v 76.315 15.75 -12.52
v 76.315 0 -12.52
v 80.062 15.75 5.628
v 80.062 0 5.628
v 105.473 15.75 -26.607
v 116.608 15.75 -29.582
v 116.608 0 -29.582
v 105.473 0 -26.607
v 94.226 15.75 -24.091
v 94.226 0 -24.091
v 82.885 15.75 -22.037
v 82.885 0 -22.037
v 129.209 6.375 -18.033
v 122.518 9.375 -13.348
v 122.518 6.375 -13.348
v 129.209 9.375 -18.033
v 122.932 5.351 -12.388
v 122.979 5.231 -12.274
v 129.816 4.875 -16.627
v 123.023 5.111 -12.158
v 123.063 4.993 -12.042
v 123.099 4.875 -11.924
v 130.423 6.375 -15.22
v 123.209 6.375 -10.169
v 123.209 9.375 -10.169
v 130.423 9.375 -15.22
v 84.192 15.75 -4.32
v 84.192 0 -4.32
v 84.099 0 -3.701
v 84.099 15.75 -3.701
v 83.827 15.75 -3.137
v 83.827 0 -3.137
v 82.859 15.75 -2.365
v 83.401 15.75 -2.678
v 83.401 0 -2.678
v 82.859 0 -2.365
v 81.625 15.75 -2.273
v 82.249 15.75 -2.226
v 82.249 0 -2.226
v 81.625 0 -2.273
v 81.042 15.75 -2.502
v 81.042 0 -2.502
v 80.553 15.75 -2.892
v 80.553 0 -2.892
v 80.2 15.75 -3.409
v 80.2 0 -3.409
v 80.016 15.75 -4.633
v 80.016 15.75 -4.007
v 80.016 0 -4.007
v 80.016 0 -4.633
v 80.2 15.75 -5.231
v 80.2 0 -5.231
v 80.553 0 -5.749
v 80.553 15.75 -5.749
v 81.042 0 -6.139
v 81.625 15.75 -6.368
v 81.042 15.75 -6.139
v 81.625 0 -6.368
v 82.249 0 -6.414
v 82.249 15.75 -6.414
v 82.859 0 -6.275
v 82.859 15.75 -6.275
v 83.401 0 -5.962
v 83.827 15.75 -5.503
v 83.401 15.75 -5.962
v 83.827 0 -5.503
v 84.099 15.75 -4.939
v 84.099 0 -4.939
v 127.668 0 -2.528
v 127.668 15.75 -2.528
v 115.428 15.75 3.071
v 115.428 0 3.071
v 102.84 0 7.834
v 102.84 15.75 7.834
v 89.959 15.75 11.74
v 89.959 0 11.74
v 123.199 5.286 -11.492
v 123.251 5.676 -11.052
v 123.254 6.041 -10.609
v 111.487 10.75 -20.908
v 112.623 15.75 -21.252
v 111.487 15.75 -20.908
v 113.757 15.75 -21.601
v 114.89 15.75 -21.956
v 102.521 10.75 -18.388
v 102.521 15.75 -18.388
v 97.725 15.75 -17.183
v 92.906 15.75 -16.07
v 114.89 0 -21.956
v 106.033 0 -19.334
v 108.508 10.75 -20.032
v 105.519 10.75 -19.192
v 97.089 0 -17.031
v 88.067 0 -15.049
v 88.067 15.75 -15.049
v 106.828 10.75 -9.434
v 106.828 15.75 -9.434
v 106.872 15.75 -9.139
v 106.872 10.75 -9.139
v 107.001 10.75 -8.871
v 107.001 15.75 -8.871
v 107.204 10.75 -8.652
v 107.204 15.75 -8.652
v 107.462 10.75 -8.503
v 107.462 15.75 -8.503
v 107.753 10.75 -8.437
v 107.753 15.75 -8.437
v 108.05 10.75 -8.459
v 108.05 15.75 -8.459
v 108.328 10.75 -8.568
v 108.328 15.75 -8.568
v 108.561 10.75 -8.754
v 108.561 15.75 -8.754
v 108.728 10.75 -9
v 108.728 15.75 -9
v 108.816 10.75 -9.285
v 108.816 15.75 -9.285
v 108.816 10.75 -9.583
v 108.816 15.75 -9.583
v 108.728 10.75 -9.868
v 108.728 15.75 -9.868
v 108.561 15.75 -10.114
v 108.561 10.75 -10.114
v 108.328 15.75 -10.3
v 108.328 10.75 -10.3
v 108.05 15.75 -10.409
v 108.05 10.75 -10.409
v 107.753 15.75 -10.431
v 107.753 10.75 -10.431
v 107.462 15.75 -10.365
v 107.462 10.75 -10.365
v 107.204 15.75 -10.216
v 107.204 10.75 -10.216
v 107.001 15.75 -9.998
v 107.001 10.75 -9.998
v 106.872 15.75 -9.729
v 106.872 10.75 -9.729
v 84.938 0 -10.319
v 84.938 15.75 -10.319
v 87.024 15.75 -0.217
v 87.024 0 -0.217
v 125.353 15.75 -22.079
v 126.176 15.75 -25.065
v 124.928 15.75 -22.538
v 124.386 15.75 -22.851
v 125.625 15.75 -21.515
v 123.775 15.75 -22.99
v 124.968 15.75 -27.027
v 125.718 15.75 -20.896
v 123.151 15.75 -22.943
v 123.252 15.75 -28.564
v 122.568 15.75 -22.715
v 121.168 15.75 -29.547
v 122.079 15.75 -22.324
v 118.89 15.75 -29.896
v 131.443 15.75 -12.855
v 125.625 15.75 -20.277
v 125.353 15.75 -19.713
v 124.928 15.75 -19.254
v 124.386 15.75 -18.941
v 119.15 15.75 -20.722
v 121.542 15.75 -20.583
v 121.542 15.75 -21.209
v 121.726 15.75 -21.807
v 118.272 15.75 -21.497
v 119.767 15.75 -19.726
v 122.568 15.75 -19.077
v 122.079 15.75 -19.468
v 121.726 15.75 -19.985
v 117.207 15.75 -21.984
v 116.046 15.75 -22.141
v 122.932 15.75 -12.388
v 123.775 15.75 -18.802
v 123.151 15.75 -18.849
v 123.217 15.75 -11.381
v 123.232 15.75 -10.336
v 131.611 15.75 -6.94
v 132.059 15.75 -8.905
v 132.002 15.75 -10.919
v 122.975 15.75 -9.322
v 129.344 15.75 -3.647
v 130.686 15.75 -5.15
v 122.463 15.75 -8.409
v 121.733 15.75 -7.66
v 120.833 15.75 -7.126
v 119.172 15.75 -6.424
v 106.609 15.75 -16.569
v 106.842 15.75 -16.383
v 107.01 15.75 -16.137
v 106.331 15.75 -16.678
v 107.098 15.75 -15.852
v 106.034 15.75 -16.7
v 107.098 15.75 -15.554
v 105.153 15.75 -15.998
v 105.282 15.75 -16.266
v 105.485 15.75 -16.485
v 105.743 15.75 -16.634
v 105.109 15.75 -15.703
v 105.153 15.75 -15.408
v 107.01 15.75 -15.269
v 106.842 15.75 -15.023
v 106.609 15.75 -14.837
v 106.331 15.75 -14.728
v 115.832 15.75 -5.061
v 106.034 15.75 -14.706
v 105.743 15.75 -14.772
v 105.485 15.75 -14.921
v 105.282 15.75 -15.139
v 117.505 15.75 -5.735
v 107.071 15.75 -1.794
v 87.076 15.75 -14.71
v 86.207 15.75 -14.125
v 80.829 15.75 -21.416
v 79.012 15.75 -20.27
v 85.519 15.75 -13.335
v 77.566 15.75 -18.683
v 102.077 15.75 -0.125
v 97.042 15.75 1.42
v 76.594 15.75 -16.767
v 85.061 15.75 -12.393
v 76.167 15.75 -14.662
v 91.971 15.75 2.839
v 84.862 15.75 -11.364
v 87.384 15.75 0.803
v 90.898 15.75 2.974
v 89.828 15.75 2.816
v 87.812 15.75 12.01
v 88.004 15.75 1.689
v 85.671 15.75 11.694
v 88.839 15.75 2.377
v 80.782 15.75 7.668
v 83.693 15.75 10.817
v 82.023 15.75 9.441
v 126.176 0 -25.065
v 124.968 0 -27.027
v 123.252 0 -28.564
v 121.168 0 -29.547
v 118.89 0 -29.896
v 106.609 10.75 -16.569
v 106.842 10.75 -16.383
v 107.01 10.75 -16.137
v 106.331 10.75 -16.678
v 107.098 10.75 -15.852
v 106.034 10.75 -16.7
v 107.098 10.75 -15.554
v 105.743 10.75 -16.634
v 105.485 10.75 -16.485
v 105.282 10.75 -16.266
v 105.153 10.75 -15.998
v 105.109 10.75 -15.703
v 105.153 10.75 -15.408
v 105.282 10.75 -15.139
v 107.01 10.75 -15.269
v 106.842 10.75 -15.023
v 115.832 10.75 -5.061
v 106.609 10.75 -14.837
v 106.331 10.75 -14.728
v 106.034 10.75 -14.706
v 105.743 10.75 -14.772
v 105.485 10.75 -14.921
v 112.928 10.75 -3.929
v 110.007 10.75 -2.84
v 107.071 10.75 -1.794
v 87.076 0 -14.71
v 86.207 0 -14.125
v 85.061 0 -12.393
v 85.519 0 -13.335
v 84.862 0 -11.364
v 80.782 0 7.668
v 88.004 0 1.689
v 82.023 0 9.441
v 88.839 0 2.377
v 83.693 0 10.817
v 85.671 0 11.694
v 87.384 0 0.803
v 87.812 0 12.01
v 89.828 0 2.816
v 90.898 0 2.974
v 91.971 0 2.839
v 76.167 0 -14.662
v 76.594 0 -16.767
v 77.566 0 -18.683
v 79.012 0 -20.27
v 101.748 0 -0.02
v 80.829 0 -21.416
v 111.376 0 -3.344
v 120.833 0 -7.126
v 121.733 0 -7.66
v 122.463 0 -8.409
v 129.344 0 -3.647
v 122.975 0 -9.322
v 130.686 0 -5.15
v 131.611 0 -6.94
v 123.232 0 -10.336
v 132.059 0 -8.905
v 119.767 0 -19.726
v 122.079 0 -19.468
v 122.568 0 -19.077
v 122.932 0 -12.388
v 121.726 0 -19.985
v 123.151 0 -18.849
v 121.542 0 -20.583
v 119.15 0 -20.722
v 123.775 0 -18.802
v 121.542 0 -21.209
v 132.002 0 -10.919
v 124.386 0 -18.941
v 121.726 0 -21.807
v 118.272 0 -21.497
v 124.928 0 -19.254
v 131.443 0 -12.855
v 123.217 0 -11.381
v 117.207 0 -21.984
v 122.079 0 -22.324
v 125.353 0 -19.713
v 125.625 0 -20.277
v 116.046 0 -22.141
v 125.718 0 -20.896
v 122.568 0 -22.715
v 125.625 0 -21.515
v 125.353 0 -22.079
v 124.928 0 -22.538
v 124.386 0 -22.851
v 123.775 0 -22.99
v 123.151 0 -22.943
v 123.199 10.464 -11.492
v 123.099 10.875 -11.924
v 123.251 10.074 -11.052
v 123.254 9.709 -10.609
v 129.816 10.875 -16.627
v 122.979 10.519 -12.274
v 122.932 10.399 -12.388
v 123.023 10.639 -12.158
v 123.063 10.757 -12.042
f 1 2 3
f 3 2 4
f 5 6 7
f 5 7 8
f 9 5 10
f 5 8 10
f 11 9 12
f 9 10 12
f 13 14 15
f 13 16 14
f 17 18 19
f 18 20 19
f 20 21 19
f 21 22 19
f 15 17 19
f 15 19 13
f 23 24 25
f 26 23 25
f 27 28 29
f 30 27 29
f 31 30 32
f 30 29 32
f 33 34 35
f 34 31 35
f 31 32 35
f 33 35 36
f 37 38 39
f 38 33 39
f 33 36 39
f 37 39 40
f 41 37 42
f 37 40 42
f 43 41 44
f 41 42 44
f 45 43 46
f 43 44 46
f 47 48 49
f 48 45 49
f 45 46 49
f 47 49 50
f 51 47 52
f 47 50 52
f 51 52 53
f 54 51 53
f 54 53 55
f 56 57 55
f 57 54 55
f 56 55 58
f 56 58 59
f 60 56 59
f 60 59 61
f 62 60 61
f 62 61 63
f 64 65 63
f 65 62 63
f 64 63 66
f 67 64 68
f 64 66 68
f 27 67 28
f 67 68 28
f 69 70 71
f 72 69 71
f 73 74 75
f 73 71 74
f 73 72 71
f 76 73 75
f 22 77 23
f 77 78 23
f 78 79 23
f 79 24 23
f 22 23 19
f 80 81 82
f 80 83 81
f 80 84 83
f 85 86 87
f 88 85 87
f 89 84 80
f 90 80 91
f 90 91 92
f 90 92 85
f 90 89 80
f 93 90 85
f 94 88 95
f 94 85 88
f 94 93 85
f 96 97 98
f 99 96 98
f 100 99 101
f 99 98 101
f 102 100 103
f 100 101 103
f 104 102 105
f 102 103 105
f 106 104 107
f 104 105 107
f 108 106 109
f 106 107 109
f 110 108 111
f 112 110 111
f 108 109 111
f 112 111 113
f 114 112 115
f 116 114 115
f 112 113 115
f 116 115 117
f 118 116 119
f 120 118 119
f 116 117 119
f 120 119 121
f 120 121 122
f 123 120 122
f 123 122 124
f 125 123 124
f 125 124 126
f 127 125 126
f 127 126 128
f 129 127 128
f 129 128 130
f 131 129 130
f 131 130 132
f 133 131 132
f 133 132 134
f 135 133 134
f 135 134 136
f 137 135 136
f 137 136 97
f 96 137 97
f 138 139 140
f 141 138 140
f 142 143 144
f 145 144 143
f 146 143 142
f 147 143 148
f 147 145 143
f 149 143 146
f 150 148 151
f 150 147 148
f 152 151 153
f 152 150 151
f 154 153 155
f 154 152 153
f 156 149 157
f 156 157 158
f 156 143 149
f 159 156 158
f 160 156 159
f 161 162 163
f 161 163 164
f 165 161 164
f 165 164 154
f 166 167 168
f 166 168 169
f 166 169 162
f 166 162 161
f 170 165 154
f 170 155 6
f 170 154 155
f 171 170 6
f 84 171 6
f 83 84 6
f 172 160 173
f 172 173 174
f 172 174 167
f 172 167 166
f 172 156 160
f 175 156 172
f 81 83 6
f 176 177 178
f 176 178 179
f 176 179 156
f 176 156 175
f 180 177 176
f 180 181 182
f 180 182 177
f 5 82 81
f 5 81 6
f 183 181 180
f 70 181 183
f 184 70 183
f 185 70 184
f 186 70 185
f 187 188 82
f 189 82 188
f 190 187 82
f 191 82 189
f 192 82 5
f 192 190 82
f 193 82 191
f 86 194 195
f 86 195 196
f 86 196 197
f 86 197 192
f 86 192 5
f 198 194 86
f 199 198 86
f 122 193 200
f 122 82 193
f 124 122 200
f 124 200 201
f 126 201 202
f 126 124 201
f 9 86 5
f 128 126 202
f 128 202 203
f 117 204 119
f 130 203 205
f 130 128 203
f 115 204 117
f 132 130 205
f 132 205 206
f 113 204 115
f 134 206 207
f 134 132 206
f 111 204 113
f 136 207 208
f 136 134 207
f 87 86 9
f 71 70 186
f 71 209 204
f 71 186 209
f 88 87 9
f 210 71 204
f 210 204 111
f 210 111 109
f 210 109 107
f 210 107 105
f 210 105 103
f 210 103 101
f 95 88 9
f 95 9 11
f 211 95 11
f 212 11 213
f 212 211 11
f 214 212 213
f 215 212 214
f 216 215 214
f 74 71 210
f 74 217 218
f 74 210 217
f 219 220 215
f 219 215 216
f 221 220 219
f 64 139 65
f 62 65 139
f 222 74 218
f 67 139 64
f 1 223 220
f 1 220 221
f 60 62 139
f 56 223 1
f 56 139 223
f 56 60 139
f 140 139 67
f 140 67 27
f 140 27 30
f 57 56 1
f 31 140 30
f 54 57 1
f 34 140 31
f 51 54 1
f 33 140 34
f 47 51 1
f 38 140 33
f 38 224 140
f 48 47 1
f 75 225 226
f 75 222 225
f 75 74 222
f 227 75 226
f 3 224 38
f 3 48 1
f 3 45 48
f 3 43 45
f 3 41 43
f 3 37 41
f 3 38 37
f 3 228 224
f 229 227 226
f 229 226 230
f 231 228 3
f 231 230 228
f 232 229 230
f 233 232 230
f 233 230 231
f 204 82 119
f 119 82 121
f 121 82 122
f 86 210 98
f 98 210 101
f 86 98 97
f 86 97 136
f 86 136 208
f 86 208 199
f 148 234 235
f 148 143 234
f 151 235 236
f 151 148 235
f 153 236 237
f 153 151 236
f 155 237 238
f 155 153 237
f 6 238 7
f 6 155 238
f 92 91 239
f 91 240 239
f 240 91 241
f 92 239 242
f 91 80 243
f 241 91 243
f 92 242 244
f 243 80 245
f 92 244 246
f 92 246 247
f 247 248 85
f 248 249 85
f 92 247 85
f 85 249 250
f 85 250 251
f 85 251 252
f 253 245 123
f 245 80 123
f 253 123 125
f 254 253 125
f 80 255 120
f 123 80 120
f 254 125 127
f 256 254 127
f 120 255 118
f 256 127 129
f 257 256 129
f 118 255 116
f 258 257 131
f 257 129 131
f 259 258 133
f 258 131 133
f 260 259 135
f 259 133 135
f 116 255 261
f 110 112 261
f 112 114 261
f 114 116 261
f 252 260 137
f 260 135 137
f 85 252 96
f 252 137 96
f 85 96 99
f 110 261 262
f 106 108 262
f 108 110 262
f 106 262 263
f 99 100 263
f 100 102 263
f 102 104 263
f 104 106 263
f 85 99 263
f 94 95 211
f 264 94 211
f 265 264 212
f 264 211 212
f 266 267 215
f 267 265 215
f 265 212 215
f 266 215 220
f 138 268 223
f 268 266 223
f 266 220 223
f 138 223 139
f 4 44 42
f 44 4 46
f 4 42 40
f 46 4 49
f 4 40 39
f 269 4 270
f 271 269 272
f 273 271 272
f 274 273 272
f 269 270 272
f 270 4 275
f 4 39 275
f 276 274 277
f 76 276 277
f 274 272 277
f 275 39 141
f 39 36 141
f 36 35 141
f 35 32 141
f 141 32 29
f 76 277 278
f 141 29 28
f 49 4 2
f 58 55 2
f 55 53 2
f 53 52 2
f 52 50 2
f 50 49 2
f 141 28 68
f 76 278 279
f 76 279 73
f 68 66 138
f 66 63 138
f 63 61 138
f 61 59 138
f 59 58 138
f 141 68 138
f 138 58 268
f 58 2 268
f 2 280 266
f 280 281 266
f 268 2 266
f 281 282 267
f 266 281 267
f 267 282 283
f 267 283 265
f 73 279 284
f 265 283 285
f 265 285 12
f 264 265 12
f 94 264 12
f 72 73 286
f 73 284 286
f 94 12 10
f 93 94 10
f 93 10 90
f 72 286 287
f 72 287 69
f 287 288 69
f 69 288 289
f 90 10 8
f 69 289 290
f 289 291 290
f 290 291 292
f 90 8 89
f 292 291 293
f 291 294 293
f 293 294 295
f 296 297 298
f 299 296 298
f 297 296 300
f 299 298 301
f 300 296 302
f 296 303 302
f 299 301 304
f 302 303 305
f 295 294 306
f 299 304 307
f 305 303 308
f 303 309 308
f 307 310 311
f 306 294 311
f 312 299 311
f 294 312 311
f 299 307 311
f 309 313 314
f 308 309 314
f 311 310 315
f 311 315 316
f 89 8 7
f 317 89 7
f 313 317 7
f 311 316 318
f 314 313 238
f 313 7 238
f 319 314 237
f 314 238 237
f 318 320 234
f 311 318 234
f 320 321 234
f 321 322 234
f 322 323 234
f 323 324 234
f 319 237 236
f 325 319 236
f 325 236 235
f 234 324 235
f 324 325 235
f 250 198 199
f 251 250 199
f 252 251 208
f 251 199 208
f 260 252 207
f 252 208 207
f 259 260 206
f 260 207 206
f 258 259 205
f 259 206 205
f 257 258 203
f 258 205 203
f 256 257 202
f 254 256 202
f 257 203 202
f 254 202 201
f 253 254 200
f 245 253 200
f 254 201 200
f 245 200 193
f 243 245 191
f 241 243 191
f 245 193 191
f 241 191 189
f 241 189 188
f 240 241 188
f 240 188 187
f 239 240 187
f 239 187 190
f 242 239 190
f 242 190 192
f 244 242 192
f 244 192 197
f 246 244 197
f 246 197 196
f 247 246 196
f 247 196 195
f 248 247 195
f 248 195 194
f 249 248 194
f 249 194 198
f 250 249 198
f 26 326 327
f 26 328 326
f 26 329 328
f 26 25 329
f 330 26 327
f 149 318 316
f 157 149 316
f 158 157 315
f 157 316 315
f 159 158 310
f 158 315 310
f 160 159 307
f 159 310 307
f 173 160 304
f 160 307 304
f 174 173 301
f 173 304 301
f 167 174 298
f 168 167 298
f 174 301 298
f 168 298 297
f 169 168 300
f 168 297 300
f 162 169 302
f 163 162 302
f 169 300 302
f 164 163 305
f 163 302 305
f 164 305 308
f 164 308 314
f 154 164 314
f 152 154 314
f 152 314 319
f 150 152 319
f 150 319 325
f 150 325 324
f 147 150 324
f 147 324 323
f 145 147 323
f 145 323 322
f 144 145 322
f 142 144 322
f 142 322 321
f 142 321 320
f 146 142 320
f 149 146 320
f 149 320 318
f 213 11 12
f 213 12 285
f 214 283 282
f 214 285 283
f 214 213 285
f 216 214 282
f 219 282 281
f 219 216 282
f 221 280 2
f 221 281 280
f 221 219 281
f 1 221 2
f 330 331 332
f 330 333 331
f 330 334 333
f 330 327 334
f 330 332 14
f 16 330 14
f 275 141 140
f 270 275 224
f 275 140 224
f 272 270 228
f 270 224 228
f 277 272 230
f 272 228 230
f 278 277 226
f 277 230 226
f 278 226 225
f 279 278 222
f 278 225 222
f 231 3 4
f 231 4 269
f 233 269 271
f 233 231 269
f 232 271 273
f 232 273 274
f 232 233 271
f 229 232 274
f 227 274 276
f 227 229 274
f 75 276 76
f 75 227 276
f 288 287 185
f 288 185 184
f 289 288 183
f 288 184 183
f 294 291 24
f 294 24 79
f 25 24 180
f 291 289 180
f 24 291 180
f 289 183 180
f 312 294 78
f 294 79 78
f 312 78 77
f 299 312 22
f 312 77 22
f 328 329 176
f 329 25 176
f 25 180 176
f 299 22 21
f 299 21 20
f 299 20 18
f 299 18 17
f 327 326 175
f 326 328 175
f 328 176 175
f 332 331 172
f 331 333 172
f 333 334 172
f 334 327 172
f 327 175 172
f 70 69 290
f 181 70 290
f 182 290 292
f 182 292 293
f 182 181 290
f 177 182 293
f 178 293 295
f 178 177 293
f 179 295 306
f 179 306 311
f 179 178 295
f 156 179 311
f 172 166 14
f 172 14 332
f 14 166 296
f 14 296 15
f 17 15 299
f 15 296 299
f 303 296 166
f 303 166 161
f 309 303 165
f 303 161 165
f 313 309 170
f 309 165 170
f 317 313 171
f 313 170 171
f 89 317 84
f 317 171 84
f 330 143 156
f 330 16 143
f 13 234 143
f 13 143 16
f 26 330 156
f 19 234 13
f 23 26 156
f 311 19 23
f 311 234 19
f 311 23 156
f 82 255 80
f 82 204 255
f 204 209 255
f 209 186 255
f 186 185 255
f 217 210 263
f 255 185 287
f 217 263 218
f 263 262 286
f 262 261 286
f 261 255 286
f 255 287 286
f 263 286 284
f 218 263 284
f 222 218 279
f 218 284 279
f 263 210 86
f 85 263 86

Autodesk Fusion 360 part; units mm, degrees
sketch "Sketch1" plane through (0, 0, 0) normal (0, 1, 0) x (1, 0, 0)
  line L0 (159.1401, 45.7067) -> (169.6952, 30.6325) construction
  line L1 (-17.5, 10) -> (-10.1, 10)
  line L2 (-18.6, 18.5) -> (-18.6, -18.5)
  line L3 (-17.5, 10) -> (-18.6, 10)
  circle A0 centre (0, 0) radius 2.5
  line L4 (74.5974, 20.8368) -> (81.7385, -13.7478)
  arc A1 (38.4, 18.5) -> (169.9824, 51.1436) centre (38.4, 300.018) ccw
  line L5 (169.9824, 51.1436) -> (178.5861, 38.8564)
  arc A2 (37.3, 10) -> (161.7212, 42.0206) centre (37.3, 267.7398) ccw
  line L6 (-10.1, -10) -> (29.9, -10)
  line L7 (-10.1, 10) -> (-10.1, -10)
  line L8 (29.9, 10) -> (-10.1, 10)
  line L9 (-17.5, -10) -> (-18.6, -10)
  line L10 (-17.5, -10) -> (-17.5, 10)
  line L11 (29.9, -10) -> (29.9, 10)
  line L12 (38.4, -18.5) -> (38.4, 18.5) construction
  line L13 (161.7212, 42.0206) -> (167.1141, 34.3187)
  line L14 (82.53, 21.9804) -> (89.5169, -11.8572)
  line L15 (9.9, -10) -> (9.9, -18.5) construction
  arc A3 (38.4, -18.5) -> (178.5861, 38.8564) centre (38.4, 181.4943) ccw
  line L16 (124.5058, 8.7395) -> (125.8994, 25.7068) construction
  line L17 (0, 0) -> (174.2843, 45) construction
  line L18 (-18.6, -18.5) -> (38.4, -18.5)
  line L19 (115.6359, 29.3023) -> (127.2705, 2.3303)
  line L20 (-10.1, -10) -> (-17.5, -10)
  line L21 (-10.1, 10) -> (-10.1, -10)
  line L22 (169.6952, 30.6325) -> (169.9824, 51.1436) construction
  line L23 (29.9, 10) -> (29.9, -10)
  line L24 (123.3477, 31.6223) -> (134.3836, 6.0382)
  arc A4 (37.3, -10) -> (167.1141, 34.3187) centre (37.3, 202.279) ccw
  line L25 (29.9, -10) -> (37.3, -10)
  line L26 (9.9, 10) -> (9.9, 18.5) construction
  line L27 (159.1401, 45.7067) -> (178.5861, 38.8564) construction
  line L28 (37.3, -10) -> (37.3, 10)
  line L29 (80.0659, -5.6475) -> (84.1183, 14.2879) construction
  line L30 (37.3, 10) -> (29.9, 10)
  line L31 (38.4, 18.5) -> (-18.6, 18.5)
  circle A5 centre (82.0921, 4.3202) radius 2.1
  circle A6 centre (125.2026, 17.2232) radius 2.1
  circle A7 centre (123.6183, 20.8961) radius 2.1
  point P0 (125.2026, 17.2232)
  point P1 (174.2843, 45)
  point P2 (37.3, 0)
  point P3 (82.0921, 4.3202)
  point P4 (-6.8918, -8.1801)
  point P5 (169.8534, 41.9327)
  point P6 (9.9, 13.85)
  dimension "d1" = 5
  dimension "d2" = 10.1
  dimension "d3" = 40
  dimension "d4" = 20
  dimension "d5" = 10
  dimension "d6" = 7.4
  dimension "d7" = 8.5
  dimension "d8" = 8.5
  dimension "d9" = 8.5
  dimension "d10" = 8.5
  dimension "d11" = 180
  dimension "d12" = 45
  dimension "d13" = 35
  dimension "d14" = 15
  dimension "d15" = 12
  dimension "d16" = 4.5
  dimension "d17" = 4.5
  dimension "d18" = 8
  dimension "d19" = 8
  dimension "d20" = 45
  dimension "d21" = 45
  dimension "d22" = 11.667
  dimension "d23" = 11.667
  dimension "d24" = 27.7
  dimension "d25" = 13.85
  dimension "d32" = 4.2
  dimension "d53" = 4
  dimension "d54" = 4
extrude "Extrude1" add sketch "Sketch1" along normal blind 15.75 contours L4 A2 L14 A4 | L4 A1 A2 L14 | L4 L14 A3 A4 | A1 A2 L14 L19 | L14 A3 L19 A4 | A1 A2 L19 L24 | A2 L19 L24 A4 | A3 L19 L24 A4 | A6 A7 picked at (125.6121, 16.5727)
fillet "Fillet1" radius 4 4 edges at (84.1183, 7.875, -14.2879) (87.8714, 7.875, 3.8882) (124.5058, 7.875, -8.7395) (118.3255, 7.875, -23.0672)
fillet "Fillet2" radius 8 4 edges at (81.7385, 7.875, 13.7478) (74.5974, 7.875, -20.8368) (123.3477, 7.875, -31.6223) (134.3836, 7.875, -6.0382)
sketch "Sketch3" plane through (0, 15.75, 0) normal (0, 1, 0) x (-1, 0, 0)
  arc A0 (-127.668, -2.528) -> (-131.4429, -12.8555) centre (-124.0972, -9.6868) ccw
  line L0 (-131.4429, -12.8555) -> (-126.1762, -25.0651)
  arc A1 (-126.1762, -25.0651) -> (-116.608, -29.5815) centre (-118.8305, -21.8964) ccw
  arc A2 (-82.8853, -22.037) -> (-116.608, -29.5815) centre (-38.4, -300.018) ccw
  arc A3 (-82.8853, -22.037) -> (-76.3147, -12.5198) centre (-84.1494, -14.1375) ccw
  line L1 (-76.3147, -12.5198) -> (-80.0619, 5.6279)
  arc A4 (-80.0619, 5.6279) -> (-89.959, 11.7397) centre (-87.8966, 4.0101) ccw
  arc A5 (-89.959, 11.7397) -> (-127.668, -2.528) centre (-38.4, -181.4943) ccw
  circle A6 centre (-82.0921, -4.3202) radius 2.1
  arc A7 (-88.0674, -15.0493) -> (-114.8897, -21.9561) centre (-37.3, -267.7398) ccw
  arc A8 (-119.7668, -19.726) -> (-114.8897, -21.9561) centre (-116.0939, -18.1416) ccw
  line L2 (-119.7668, -19.726) -> (-122.9321, -12.3879)
  arc A9 (-120.8332, -7.1263) -> (-122.9321, -12.3879) centre (-119.2592, -10.8036) ccw
  arc A10 (-91.9713, 2.8391) -> (-120.8332, -7.1263) centre (-37.3, -202.279) ccw
  arc A11 (-87.0237, -0.2171) -> (-91.9713, 2.8391) centre (-90.9411, -1.026) ccw
  line L3 (-87.0237, -0.2171) -> (-84.9379, -10.3188)
  arc A12 (-88.0674, -15.0493) -> (-84.9379, -10.3188) centre (-88.8553, -11.1277) ccw
  line L4 (-114.8965, -4.6907) -> (-110.5283, -20.6216)
  line L5 (-110.5812, -20.4287) -> (-103.5285, -18.4949)
  line L6 (-103.5285, -18.4949) -> (-107.0323, -5.7165)
  line L7 (-107.0323, -5.7165) -> (-114.085, -7.6503)
  line L8 (-115.832, -5.0606) -> (-111.4868, -20.9076)
  line L9 (-107.071, -1.7936) -> (-102.5208, -18.3885)
  circle A13 centre (-107.8275, -9.4342) radius 1
  circle A14 centre (-106.1087, -15.7028) radius 1
  line L10 (-107.8275, -9.4342) -> (-106.1087, -15.7028)
  circle A15 centre (-123.6183, -20.8961) radius 2.1
  point P0 (-110.5283, -20.6216)
  point P1 (-106.9681, -12.5685)
  dimension "d33" = 8
  dimension "d34" = 0.2
  dimension "d35" = 10
  dimension "d36" = 13.25
  dimension "d37" = 7.313
  dimension "d38" = 1
  dimension "d39" = 1
  dimension "d40" = 6.5
  dimension "d41" = 6.625
  dimension "d42" = 1.75
  dimension "d43" = 2
extrude "Extrude2" add sketch "Sketch3" against normal blind 5 contours A7 A10 L4 L5 L6 L7 L9 | A7 A10 L4 L8 | L4 L5 L6 L7
ref_plane "WorkPlane1" through (126.1762, 7.875, -25.0651) normal (-0.819152, 0, 0.573576) x (0, -1, 0)
sketch "Sketch5" plane through (96.4423, 0, -67.5296) normal (-0.819152, 0, 0.573576) x (0, -1, 0)
  line L0 (-6.375, 62.3396) -> (-9.375, 62.3396)
  line L1 (-9.375, 62.3396) -> (-9.375, 59.3396)
  line L2 (-9.375, 59.3396) -> (-6.375, 59.3396)
  line L3 (-6.375, 59.3396) -> (-6.375, 62.3396)
  line L4 (-9.375, 62.3396) -> (-10.875, 60.8396)
  line L5 (-10.875, 60.8396) -> (-9.375, 59.3396)
  line L6 (-6.375, 62.3396) -> (-4.875, 60.8396)
  line L7 (-4.875, 60.8396) -> (-6.375, 59.3396)
  line L8 (-7.875, 63.0141) -> (-7.875, 45.7648) construction
  line L9 (0, 51.8396) -> (0, 64.862)
  line L10 (-15.75, 51.8396) -> (0, 51.8396)
  dimension "d57" = 45
  dimension "d58" = 45
  dimension "d59" = 3
  dimension "d60" = 7.875
  dimension "d61" = 1.5
  dimension "d62" = 7.5
extrude "Extrude4" cut sketch "Sketch5" along normal blind 17
equation "d41 = d36 / 2"
equation "d53 = d19 / 2"
equation "d56 = 90 deg - 35 deg"
equation "d60 = ( 15.75 / 2 ) * 1 mm"
equation "d61 = d59 / 2"
